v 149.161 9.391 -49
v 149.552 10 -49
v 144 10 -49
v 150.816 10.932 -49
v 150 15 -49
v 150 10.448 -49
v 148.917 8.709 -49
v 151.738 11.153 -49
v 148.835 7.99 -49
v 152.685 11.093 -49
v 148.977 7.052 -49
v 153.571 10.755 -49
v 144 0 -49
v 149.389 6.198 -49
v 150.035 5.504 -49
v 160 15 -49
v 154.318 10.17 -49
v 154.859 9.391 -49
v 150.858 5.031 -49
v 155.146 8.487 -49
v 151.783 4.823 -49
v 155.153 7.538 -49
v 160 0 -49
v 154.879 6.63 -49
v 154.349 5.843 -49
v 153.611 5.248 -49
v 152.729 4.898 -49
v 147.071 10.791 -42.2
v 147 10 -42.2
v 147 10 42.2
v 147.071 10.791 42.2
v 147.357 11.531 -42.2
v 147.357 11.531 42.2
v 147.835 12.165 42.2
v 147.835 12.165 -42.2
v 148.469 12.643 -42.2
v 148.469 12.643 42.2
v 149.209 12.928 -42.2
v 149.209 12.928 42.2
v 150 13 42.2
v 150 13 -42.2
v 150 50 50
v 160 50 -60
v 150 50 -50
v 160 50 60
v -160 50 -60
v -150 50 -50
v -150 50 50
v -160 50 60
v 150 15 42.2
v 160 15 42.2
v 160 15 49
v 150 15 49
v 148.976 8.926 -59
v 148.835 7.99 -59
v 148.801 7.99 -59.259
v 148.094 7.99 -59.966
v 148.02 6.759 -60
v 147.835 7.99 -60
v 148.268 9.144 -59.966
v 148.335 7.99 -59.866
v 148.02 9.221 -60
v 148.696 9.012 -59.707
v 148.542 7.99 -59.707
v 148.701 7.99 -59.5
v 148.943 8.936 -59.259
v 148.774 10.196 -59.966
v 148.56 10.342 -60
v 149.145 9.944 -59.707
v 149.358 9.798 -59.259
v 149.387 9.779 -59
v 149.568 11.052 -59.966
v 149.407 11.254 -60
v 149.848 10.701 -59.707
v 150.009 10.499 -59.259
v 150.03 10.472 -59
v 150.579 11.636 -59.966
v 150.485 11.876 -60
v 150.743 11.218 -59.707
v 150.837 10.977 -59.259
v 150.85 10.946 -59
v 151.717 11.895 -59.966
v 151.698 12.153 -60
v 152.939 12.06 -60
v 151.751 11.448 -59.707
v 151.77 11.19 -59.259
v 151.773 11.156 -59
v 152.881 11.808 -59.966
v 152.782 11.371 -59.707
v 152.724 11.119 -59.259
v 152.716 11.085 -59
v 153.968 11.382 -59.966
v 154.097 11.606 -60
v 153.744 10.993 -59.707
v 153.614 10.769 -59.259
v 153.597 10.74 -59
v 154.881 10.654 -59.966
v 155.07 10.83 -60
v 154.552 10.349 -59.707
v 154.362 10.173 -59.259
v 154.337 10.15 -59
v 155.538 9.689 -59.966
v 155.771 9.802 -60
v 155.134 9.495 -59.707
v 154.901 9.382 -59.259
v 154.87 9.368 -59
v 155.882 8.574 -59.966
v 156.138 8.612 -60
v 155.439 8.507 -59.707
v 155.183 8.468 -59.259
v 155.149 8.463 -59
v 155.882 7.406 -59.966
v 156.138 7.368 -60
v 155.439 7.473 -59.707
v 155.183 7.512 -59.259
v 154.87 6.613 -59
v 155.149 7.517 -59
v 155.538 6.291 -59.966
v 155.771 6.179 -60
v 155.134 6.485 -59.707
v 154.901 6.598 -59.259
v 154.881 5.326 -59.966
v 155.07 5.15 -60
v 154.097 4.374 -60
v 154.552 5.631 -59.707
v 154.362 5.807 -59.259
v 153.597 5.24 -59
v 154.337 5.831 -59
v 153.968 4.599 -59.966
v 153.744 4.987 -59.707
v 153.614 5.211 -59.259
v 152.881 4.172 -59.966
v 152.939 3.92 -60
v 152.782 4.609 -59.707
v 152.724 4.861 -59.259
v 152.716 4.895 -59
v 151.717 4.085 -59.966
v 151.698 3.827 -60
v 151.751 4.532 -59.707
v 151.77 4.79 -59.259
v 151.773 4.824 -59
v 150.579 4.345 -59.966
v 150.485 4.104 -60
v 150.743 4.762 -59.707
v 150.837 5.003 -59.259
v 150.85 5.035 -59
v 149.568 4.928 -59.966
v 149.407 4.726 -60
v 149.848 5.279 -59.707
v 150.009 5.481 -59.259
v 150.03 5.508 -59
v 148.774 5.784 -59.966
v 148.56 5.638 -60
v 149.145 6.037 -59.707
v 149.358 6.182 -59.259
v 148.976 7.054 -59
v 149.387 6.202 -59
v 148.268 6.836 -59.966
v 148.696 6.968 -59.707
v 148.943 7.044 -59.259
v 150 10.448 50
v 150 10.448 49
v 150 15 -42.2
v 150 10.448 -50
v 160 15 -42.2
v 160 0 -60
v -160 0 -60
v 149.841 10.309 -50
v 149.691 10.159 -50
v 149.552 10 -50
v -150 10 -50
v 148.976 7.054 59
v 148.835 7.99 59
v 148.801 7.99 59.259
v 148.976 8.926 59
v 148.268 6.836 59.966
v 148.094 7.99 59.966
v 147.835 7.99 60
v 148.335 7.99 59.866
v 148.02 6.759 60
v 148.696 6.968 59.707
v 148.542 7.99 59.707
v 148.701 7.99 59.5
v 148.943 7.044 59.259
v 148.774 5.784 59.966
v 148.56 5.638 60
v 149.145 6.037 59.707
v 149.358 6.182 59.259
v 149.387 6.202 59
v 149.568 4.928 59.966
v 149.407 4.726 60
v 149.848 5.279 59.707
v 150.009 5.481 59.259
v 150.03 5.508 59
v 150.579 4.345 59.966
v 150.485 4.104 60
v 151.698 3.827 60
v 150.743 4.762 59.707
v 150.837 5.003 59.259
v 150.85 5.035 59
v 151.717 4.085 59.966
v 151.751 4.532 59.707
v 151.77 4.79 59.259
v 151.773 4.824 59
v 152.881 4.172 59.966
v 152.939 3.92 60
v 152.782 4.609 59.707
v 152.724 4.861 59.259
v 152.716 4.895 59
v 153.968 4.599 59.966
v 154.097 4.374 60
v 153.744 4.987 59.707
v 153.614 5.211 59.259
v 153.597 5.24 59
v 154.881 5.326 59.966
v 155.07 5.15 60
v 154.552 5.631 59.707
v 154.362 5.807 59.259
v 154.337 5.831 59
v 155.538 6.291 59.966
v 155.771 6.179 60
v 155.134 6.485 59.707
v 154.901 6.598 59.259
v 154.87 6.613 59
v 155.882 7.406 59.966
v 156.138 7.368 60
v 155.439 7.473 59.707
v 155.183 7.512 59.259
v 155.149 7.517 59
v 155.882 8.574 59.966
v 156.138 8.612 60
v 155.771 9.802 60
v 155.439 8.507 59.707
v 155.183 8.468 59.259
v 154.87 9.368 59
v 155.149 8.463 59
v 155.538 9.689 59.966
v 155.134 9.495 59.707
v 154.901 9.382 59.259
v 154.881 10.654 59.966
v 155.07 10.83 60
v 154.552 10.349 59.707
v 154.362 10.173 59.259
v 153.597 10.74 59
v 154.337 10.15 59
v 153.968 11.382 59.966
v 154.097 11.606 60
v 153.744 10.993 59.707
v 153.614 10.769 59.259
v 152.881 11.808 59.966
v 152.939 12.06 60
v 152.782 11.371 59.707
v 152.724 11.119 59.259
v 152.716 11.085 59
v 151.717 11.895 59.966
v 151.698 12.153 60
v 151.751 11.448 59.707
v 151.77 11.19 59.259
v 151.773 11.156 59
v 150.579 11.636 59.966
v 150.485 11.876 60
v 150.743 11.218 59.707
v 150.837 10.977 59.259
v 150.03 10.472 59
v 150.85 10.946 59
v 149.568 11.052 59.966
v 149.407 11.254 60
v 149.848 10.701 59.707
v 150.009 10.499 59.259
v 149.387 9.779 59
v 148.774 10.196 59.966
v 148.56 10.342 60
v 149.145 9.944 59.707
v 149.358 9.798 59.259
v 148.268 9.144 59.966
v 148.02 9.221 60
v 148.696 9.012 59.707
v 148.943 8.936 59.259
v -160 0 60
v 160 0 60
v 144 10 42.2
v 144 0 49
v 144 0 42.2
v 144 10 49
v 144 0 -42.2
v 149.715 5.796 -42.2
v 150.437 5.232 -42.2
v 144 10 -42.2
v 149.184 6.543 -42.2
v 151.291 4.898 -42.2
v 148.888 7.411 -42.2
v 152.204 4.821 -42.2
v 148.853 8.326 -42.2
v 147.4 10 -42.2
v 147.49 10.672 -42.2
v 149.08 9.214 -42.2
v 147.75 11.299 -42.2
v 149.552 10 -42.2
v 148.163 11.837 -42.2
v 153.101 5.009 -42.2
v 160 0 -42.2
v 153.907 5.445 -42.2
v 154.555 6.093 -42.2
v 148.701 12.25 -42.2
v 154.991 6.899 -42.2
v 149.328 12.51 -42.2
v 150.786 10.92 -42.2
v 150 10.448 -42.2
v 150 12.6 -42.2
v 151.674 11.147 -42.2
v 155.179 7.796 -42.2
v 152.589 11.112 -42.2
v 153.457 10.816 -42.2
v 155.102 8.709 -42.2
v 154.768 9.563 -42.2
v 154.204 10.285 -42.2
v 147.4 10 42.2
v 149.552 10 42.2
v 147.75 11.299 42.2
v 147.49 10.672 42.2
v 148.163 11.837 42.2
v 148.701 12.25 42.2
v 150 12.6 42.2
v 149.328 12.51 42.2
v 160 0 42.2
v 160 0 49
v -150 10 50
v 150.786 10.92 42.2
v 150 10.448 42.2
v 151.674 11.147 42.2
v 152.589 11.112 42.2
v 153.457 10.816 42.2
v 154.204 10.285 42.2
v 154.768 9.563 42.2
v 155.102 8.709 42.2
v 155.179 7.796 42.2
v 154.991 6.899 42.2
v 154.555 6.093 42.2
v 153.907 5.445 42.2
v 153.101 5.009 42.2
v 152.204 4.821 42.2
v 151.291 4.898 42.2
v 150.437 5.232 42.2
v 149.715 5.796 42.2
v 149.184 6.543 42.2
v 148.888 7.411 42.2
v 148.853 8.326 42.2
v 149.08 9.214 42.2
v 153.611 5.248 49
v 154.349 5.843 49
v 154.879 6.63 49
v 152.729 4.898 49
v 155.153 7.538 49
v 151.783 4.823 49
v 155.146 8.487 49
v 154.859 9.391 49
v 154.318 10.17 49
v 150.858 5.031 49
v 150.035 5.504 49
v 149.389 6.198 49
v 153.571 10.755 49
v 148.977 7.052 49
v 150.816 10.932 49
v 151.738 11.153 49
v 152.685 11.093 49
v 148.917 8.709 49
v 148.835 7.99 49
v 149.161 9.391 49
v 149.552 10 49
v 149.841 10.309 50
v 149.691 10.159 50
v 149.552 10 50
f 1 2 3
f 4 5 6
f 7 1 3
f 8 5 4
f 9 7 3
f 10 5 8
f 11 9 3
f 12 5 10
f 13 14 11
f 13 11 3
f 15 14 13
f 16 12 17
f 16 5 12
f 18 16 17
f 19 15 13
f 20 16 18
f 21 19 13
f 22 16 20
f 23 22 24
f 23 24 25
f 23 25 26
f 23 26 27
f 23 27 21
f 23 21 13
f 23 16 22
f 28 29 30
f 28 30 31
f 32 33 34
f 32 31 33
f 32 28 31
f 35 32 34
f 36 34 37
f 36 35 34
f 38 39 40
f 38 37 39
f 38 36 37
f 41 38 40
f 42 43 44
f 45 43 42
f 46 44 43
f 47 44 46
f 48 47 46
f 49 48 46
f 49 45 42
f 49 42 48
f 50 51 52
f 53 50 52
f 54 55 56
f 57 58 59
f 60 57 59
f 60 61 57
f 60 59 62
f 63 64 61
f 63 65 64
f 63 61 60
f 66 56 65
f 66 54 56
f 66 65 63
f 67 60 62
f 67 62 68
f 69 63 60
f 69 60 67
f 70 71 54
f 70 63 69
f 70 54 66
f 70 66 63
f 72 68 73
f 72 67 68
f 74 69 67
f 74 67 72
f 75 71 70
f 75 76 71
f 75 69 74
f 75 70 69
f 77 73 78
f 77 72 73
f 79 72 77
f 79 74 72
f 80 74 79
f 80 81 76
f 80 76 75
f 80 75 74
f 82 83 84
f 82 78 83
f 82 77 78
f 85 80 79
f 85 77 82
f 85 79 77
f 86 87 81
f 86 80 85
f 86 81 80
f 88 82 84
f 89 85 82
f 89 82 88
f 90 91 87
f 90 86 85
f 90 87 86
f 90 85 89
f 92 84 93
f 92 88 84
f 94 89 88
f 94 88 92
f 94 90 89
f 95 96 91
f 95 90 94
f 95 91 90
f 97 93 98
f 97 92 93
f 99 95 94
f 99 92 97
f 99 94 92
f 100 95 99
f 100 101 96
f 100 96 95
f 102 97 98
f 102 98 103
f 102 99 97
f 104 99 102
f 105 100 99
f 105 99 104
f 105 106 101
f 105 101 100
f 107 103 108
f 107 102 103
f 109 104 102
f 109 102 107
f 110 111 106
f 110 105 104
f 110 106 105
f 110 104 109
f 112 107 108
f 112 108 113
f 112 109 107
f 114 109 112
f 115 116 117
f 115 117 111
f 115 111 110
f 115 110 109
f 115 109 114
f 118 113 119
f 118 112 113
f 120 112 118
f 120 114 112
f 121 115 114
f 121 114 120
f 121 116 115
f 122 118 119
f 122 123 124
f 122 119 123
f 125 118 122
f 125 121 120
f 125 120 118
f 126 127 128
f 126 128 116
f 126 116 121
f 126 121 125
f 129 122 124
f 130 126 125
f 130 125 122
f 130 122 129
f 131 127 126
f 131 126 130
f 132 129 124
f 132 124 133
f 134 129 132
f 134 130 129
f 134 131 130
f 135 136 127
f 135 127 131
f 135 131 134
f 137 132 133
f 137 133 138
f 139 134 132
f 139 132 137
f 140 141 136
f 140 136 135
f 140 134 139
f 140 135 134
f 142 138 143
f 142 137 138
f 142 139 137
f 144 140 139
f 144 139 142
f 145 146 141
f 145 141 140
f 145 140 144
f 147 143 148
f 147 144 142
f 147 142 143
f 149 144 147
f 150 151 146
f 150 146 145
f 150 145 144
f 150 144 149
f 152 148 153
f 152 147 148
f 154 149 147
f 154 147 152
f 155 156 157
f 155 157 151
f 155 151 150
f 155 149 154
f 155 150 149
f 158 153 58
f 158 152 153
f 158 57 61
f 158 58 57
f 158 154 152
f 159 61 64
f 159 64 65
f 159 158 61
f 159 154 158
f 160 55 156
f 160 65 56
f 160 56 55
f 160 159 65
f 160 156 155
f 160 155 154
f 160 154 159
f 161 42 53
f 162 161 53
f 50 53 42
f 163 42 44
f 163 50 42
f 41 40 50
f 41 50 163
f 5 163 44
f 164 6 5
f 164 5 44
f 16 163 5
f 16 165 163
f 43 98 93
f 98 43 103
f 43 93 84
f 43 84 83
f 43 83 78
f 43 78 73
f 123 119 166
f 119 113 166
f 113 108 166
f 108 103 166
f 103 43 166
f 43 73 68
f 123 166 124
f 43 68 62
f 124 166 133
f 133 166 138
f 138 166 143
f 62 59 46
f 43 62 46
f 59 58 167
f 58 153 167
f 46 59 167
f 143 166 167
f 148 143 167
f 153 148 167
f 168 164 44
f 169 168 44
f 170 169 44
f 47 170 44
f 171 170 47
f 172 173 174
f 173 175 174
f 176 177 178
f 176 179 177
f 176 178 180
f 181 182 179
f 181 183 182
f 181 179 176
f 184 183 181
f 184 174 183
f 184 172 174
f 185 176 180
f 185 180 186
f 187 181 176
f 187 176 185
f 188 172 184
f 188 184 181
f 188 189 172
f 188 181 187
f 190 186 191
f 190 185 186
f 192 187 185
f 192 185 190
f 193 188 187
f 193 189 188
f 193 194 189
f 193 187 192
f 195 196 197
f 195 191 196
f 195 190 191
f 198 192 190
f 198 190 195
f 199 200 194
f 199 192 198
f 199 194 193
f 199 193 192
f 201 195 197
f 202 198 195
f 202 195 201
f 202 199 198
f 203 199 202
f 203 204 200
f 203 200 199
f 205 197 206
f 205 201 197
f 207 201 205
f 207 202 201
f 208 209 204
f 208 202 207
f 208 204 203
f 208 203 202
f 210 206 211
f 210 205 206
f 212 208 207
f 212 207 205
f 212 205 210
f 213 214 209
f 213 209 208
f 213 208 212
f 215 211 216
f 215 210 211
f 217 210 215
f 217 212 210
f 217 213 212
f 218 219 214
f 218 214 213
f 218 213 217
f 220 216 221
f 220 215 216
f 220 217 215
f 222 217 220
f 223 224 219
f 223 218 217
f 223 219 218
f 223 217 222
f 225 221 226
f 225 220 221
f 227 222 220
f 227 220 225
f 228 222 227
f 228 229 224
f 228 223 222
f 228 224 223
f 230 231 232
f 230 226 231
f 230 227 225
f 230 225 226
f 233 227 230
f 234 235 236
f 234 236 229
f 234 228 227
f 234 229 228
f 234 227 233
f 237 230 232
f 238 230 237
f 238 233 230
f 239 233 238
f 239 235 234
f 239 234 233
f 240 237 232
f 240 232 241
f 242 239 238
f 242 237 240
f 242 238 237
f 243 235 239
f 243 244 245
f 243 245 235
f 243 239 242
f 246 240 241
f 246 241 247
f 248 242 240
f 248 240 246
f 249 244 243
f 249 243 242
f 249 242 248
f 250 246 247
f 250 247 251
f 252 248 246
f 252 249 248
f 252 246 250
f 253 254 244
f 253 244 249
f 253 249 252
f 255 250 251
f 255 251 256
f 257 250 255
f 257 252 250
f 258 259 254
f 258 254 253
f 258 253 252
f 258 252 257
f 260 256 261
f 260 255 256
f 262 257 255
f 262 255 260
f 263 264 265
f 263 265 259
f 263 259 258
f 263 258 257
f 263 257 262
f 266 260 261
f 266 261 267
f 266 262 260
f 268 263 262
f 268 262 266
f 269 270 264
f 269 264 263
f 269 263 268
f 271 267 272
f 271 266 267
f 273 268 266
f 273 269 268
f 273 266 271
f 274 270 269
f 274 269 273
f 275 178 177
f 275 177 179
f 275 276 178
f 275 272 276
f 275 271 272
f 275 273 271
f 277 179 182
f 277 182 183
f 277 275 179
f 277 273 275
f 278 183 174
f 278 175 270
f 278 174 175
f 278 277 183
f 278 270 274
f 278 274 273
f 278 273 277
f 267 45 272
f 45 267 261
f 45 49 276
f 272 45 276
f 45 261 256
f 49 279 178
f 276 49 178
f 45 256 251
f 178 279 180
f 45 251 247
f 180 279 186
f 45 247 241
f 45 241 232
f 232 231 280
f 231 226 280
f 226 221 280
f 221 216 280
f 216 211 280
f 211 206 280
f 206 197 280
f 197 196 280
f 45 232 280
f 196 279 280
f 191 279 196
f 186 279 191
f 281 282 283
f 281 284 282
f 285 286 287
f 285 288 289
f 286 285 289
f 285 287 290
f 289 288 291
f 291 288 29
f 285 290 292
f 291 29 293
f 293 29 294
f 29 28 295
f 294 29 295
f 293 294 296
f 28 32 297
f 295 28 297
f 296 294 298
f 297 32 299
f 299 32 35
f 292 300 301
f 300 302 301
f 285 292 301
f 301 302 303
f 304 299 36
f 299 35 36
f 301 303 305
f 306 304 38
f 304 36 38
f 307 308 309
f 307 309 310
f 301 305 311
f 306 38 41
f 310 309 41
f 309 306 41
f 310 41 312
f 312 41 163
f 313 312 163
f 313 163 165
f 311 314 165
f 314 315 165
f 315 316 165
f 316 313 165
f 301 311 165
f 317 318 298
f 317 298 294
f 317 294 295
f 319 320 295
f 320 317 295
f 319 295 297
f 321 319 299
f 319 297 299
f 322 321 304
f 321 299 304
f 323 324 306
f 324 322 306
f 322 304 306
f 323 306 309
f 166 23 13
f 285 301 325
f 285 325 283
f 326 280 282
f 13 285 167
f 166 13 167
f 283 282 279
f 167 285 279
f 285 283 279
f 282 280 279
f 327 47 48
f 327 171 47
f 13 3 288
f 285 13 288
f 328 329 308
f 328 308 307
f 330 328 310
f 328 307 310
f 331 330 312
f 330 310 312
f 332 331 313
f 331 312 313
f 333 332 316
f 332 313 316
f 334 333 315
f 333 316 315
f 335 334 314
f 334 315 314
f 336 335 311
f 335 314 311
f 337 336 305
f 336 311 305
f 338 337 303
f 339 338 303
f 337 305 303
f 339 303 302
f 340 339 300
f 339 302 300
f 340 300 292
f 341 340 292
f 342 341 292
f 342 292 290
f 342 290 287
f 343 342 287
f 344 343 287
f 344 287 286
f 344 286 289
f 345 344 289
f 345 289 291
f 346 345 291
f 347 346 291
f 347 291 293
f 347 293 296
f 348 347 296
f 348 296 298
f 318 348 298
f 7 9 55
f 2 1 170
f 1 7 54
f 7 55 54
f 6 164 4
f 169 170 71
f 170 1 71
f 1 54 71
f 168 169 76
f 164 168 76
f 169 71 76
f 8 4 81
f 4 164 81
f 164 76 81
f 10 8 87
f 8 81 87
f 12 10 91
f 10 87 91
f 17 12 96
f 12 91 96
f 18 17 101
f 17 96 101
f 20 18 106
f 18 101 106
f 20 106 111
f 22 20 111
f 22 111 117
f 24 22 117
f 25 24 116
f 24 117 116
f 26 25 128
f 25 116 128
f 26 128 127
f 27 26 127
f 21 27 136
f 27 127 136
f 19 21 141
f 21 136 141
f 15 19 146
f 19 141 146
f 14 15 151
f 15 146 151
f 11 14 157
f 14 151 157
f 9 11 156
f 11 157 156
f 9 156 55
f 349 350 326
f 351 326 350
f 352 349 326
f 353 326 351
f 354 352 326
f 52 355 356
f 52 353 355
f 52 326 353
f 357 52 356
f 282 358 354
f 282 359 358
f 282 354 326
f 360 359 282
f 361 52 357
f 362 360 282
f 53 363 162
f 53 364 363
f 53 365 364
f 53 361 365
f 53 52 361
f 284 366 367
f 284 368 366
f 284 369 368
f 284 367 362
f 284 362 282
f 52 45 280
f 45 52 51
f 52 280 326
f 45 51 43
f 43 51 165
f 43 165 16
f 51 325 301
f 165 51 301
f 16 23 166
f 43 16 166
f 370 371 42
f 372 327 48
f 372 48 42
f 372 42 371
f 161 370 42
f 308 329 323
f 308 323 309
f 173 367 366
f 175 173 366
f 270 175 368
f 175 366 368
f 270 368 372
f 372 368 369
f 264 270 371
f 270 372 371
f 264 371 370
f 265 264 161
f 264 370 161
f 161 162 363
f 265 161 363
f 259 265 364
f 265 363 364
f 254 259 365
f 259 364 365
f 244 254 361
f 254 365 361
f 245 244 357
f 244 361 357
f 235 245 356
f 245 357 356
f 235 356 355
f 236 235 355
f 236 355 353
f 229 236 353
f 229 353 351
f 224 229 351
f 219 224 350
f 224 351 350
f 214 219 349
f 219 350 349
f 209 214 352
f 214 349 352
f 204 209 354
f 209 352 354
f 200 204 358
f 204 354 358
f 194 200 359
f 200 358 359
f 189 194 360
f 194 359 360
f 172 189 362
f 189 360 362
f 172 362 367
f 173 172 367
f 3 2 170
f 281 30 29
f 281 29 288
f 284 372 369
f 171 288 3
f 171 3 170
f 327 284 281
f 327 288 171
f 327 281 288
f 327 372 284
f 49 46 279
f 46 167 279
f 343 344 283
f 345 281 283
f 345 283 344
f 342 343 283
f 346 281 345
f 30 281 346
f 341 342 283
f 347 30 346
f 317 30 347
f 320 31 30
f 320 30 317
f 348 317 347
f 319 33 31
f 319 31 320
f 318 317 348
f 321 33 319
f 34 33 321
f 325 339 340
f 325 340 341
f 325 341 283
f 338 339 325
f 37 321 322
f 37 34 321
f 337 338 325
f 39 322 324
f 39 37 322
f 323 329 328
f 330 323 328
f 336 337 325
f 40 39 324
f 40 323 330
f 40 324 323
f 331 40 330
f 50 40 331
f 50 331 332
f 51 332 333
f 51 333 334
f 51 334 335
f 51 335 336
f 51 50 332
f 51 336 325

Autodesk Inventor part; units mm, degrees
ref_plane "YZ Plane" through (0, 0, 0) normal (1, 0, 0) x (0, 1, 0)
ref_plane "XZ Plane" through (0, 0, 0) normal (0, 1, 0) x (-1, 0, 0)
sketch "Sketch1" plane through (0, 0, 0) normal (0, 1, 0) x (-1, 0, 0)
  line L0 (150, 50) -> (-150, 50)
  line L1 (-150, 50) -> (-150, -50)
  line L2 (-150, -50) -> (150, -50)
  line L3 (150, -50) -> (150, 50)
  line L4 (150, 50) -> (-150, -50) construction
  line L5 (-150, 50) -> (150, -50) construction
  line L6 (160, 60) -> (-160, 60)
  line L7 (-160, 60) -> (-160, -60)
  line L8 (-160, -60) -> (160, -60)
  line L9 (160, -60) -> (160, 60)
  point P0 (0, 0)
  dimension "d0" = 100
  dimension "d1" = 300
  dimension "d2" = 10
extrude "Extrusion1" add sketch "Sketch1" along normal blind 10 contours L3 L2 L1 L0
extrude "Extrusion2" add sketch "Sketch1" along normal blind 50
sketch "Sketch2" plane through (160, 0, -60) normal (0, 0, -1) x (-1, 0, 0)
  line L0 (0, 0) -> (0, 50) projected
  line L1 (0, 0) -> (0, 3.5)
  line L2 (0, 3.5) -> (3.5, 3.5)
  line L3 (3.5, 3.5) -> (7.9901, 7.9901)
  circle A0 centre (7.9901, 7.9901) radius 3.175
  point P0 (160, 0)
  dimension "d7" = 3.5
  dimension "d8" = 3.5
  dimension "d9" = 6.35
  dimension "d10" = 135
  dimension "d11" = 6.35
extrude "Extrusion3" cut sketch "Sketch2" against normal blind 150
fillet "Fillet1" radius 1 2 edges at (155.1849, 7.9901, -60) (155.1849, 7.9901, 60)
sketch "Sketch3" plane through (160, 0, 60) normal (1, 0, 0) x (0, 0, -1)
  line L0 (0, 0) -> (0, 50) projected
  line L1 (0, 0) -> (11, 0)
  line L2 (120, 0) -> (0, 0) projected
  line L3 (11, 0) -> (17.8, 0)
  line L4 (17.8, 0) -> (17.8, 15)
  line L5 (17.8, 15) -> (11, 15)
  line L6 (11, 15) -> (11, 0)
  line L7 (120, 0) -> (120, 50) projected
  line L8 (120, 0) -> (109, 0)
  line L9 (109, 0) -> (102.2, 0)
  line L10 (102.2, 0) -> (102.2, 15)
  line L11 (102.2, 15) -> (109, 15)
  line L12 (109, 15) -> (109, 0)
  point P0 (60, 0)
  point P1 (17.8, 0)
  dimension "d15" = 11
  dimension "d16" = 6.8
  dimension "d17" = 15
  dimension "d18" = 11
  dimension "d19" = 6.8
extrude "Extrusion4" cut sketch "Sketch3" against normal blind 13
ref_plane "Work Plane1" through (-150, 50, -42.2) normal (0, 0, 1) x (1, 0, 0)
sketch "Sketch4" plane through (-150, 50, -42.2) normal (0, 0, 1) x (1, 0, 0)
  circle A0 centre (302.0099, -42.0099) radius 4.175 projected
  line L0 (300, -38.3505) -> (300, -37.0005)
  line L1 (300, -39.552) -> (300, 0) projected
  line L2 (297, -50) -> (297, -40) projected
  arc A1 (300, -37.0005) -> (297, -40) centre (299.8581, -39.8585) ccw
  line L3 (297, -40) -> (297.4, -40)
  line L4 (299.552, -40) -> (0, -40) projected
  line L5 (300, -37.0005) -> (300, -37.4005)
  arc A2 (300, -37.4005) -> (297.4, -40) centre (300.0042, -40.0047) ccw
  point P0 (150, -50)
  dimension "d23" = 1.35
  dimension "d24" = 0.4
  dimension "d25" = 0.4
extrude "Extrusion5" add sketch "Sketch4" along normal blind 84.4 contours A2 L3 A1 L0
sketch "Sketch5" plane through (0, 10, 0) normal (0, 1, 0) x (1, 0, 0)
  line L0 (147, 49) -> (147, 42.2) projected
  line L1 (147, 49) -> (144, 49)
  line L2 (144, 49) -> (144, 42.2)
  line L3 (144, 42.2) -> (147, 42.2)
  line L4 (147, 42.2) -> (147, 49)
  point P0 (0, 0)
  dimension "d28" = 3
extrude "Extrusion6" cut sketch "Sketch5" against normal blind 84.4
sketch "Sketch6" plane through (0, 10, 0) normal (0, 1, 0) x (1, 0, 0)
  line L0 (147, -49) -> (147, -42.2) projected
  line L1 (147, -49) -> (144, -49)
  line L2 (144, -49) -> (144, -42.2)
  line L3 (144, -42.2) -> (147, -42.2)
  line L4 (147, -42.2) -> (147, -49)
  point P0 (0, 0)
  dimension "d31" = 3
extrude "Extrusion7" cut sketch "Sketch6" against normal blind 84.4
properties part number "GiveBox"
